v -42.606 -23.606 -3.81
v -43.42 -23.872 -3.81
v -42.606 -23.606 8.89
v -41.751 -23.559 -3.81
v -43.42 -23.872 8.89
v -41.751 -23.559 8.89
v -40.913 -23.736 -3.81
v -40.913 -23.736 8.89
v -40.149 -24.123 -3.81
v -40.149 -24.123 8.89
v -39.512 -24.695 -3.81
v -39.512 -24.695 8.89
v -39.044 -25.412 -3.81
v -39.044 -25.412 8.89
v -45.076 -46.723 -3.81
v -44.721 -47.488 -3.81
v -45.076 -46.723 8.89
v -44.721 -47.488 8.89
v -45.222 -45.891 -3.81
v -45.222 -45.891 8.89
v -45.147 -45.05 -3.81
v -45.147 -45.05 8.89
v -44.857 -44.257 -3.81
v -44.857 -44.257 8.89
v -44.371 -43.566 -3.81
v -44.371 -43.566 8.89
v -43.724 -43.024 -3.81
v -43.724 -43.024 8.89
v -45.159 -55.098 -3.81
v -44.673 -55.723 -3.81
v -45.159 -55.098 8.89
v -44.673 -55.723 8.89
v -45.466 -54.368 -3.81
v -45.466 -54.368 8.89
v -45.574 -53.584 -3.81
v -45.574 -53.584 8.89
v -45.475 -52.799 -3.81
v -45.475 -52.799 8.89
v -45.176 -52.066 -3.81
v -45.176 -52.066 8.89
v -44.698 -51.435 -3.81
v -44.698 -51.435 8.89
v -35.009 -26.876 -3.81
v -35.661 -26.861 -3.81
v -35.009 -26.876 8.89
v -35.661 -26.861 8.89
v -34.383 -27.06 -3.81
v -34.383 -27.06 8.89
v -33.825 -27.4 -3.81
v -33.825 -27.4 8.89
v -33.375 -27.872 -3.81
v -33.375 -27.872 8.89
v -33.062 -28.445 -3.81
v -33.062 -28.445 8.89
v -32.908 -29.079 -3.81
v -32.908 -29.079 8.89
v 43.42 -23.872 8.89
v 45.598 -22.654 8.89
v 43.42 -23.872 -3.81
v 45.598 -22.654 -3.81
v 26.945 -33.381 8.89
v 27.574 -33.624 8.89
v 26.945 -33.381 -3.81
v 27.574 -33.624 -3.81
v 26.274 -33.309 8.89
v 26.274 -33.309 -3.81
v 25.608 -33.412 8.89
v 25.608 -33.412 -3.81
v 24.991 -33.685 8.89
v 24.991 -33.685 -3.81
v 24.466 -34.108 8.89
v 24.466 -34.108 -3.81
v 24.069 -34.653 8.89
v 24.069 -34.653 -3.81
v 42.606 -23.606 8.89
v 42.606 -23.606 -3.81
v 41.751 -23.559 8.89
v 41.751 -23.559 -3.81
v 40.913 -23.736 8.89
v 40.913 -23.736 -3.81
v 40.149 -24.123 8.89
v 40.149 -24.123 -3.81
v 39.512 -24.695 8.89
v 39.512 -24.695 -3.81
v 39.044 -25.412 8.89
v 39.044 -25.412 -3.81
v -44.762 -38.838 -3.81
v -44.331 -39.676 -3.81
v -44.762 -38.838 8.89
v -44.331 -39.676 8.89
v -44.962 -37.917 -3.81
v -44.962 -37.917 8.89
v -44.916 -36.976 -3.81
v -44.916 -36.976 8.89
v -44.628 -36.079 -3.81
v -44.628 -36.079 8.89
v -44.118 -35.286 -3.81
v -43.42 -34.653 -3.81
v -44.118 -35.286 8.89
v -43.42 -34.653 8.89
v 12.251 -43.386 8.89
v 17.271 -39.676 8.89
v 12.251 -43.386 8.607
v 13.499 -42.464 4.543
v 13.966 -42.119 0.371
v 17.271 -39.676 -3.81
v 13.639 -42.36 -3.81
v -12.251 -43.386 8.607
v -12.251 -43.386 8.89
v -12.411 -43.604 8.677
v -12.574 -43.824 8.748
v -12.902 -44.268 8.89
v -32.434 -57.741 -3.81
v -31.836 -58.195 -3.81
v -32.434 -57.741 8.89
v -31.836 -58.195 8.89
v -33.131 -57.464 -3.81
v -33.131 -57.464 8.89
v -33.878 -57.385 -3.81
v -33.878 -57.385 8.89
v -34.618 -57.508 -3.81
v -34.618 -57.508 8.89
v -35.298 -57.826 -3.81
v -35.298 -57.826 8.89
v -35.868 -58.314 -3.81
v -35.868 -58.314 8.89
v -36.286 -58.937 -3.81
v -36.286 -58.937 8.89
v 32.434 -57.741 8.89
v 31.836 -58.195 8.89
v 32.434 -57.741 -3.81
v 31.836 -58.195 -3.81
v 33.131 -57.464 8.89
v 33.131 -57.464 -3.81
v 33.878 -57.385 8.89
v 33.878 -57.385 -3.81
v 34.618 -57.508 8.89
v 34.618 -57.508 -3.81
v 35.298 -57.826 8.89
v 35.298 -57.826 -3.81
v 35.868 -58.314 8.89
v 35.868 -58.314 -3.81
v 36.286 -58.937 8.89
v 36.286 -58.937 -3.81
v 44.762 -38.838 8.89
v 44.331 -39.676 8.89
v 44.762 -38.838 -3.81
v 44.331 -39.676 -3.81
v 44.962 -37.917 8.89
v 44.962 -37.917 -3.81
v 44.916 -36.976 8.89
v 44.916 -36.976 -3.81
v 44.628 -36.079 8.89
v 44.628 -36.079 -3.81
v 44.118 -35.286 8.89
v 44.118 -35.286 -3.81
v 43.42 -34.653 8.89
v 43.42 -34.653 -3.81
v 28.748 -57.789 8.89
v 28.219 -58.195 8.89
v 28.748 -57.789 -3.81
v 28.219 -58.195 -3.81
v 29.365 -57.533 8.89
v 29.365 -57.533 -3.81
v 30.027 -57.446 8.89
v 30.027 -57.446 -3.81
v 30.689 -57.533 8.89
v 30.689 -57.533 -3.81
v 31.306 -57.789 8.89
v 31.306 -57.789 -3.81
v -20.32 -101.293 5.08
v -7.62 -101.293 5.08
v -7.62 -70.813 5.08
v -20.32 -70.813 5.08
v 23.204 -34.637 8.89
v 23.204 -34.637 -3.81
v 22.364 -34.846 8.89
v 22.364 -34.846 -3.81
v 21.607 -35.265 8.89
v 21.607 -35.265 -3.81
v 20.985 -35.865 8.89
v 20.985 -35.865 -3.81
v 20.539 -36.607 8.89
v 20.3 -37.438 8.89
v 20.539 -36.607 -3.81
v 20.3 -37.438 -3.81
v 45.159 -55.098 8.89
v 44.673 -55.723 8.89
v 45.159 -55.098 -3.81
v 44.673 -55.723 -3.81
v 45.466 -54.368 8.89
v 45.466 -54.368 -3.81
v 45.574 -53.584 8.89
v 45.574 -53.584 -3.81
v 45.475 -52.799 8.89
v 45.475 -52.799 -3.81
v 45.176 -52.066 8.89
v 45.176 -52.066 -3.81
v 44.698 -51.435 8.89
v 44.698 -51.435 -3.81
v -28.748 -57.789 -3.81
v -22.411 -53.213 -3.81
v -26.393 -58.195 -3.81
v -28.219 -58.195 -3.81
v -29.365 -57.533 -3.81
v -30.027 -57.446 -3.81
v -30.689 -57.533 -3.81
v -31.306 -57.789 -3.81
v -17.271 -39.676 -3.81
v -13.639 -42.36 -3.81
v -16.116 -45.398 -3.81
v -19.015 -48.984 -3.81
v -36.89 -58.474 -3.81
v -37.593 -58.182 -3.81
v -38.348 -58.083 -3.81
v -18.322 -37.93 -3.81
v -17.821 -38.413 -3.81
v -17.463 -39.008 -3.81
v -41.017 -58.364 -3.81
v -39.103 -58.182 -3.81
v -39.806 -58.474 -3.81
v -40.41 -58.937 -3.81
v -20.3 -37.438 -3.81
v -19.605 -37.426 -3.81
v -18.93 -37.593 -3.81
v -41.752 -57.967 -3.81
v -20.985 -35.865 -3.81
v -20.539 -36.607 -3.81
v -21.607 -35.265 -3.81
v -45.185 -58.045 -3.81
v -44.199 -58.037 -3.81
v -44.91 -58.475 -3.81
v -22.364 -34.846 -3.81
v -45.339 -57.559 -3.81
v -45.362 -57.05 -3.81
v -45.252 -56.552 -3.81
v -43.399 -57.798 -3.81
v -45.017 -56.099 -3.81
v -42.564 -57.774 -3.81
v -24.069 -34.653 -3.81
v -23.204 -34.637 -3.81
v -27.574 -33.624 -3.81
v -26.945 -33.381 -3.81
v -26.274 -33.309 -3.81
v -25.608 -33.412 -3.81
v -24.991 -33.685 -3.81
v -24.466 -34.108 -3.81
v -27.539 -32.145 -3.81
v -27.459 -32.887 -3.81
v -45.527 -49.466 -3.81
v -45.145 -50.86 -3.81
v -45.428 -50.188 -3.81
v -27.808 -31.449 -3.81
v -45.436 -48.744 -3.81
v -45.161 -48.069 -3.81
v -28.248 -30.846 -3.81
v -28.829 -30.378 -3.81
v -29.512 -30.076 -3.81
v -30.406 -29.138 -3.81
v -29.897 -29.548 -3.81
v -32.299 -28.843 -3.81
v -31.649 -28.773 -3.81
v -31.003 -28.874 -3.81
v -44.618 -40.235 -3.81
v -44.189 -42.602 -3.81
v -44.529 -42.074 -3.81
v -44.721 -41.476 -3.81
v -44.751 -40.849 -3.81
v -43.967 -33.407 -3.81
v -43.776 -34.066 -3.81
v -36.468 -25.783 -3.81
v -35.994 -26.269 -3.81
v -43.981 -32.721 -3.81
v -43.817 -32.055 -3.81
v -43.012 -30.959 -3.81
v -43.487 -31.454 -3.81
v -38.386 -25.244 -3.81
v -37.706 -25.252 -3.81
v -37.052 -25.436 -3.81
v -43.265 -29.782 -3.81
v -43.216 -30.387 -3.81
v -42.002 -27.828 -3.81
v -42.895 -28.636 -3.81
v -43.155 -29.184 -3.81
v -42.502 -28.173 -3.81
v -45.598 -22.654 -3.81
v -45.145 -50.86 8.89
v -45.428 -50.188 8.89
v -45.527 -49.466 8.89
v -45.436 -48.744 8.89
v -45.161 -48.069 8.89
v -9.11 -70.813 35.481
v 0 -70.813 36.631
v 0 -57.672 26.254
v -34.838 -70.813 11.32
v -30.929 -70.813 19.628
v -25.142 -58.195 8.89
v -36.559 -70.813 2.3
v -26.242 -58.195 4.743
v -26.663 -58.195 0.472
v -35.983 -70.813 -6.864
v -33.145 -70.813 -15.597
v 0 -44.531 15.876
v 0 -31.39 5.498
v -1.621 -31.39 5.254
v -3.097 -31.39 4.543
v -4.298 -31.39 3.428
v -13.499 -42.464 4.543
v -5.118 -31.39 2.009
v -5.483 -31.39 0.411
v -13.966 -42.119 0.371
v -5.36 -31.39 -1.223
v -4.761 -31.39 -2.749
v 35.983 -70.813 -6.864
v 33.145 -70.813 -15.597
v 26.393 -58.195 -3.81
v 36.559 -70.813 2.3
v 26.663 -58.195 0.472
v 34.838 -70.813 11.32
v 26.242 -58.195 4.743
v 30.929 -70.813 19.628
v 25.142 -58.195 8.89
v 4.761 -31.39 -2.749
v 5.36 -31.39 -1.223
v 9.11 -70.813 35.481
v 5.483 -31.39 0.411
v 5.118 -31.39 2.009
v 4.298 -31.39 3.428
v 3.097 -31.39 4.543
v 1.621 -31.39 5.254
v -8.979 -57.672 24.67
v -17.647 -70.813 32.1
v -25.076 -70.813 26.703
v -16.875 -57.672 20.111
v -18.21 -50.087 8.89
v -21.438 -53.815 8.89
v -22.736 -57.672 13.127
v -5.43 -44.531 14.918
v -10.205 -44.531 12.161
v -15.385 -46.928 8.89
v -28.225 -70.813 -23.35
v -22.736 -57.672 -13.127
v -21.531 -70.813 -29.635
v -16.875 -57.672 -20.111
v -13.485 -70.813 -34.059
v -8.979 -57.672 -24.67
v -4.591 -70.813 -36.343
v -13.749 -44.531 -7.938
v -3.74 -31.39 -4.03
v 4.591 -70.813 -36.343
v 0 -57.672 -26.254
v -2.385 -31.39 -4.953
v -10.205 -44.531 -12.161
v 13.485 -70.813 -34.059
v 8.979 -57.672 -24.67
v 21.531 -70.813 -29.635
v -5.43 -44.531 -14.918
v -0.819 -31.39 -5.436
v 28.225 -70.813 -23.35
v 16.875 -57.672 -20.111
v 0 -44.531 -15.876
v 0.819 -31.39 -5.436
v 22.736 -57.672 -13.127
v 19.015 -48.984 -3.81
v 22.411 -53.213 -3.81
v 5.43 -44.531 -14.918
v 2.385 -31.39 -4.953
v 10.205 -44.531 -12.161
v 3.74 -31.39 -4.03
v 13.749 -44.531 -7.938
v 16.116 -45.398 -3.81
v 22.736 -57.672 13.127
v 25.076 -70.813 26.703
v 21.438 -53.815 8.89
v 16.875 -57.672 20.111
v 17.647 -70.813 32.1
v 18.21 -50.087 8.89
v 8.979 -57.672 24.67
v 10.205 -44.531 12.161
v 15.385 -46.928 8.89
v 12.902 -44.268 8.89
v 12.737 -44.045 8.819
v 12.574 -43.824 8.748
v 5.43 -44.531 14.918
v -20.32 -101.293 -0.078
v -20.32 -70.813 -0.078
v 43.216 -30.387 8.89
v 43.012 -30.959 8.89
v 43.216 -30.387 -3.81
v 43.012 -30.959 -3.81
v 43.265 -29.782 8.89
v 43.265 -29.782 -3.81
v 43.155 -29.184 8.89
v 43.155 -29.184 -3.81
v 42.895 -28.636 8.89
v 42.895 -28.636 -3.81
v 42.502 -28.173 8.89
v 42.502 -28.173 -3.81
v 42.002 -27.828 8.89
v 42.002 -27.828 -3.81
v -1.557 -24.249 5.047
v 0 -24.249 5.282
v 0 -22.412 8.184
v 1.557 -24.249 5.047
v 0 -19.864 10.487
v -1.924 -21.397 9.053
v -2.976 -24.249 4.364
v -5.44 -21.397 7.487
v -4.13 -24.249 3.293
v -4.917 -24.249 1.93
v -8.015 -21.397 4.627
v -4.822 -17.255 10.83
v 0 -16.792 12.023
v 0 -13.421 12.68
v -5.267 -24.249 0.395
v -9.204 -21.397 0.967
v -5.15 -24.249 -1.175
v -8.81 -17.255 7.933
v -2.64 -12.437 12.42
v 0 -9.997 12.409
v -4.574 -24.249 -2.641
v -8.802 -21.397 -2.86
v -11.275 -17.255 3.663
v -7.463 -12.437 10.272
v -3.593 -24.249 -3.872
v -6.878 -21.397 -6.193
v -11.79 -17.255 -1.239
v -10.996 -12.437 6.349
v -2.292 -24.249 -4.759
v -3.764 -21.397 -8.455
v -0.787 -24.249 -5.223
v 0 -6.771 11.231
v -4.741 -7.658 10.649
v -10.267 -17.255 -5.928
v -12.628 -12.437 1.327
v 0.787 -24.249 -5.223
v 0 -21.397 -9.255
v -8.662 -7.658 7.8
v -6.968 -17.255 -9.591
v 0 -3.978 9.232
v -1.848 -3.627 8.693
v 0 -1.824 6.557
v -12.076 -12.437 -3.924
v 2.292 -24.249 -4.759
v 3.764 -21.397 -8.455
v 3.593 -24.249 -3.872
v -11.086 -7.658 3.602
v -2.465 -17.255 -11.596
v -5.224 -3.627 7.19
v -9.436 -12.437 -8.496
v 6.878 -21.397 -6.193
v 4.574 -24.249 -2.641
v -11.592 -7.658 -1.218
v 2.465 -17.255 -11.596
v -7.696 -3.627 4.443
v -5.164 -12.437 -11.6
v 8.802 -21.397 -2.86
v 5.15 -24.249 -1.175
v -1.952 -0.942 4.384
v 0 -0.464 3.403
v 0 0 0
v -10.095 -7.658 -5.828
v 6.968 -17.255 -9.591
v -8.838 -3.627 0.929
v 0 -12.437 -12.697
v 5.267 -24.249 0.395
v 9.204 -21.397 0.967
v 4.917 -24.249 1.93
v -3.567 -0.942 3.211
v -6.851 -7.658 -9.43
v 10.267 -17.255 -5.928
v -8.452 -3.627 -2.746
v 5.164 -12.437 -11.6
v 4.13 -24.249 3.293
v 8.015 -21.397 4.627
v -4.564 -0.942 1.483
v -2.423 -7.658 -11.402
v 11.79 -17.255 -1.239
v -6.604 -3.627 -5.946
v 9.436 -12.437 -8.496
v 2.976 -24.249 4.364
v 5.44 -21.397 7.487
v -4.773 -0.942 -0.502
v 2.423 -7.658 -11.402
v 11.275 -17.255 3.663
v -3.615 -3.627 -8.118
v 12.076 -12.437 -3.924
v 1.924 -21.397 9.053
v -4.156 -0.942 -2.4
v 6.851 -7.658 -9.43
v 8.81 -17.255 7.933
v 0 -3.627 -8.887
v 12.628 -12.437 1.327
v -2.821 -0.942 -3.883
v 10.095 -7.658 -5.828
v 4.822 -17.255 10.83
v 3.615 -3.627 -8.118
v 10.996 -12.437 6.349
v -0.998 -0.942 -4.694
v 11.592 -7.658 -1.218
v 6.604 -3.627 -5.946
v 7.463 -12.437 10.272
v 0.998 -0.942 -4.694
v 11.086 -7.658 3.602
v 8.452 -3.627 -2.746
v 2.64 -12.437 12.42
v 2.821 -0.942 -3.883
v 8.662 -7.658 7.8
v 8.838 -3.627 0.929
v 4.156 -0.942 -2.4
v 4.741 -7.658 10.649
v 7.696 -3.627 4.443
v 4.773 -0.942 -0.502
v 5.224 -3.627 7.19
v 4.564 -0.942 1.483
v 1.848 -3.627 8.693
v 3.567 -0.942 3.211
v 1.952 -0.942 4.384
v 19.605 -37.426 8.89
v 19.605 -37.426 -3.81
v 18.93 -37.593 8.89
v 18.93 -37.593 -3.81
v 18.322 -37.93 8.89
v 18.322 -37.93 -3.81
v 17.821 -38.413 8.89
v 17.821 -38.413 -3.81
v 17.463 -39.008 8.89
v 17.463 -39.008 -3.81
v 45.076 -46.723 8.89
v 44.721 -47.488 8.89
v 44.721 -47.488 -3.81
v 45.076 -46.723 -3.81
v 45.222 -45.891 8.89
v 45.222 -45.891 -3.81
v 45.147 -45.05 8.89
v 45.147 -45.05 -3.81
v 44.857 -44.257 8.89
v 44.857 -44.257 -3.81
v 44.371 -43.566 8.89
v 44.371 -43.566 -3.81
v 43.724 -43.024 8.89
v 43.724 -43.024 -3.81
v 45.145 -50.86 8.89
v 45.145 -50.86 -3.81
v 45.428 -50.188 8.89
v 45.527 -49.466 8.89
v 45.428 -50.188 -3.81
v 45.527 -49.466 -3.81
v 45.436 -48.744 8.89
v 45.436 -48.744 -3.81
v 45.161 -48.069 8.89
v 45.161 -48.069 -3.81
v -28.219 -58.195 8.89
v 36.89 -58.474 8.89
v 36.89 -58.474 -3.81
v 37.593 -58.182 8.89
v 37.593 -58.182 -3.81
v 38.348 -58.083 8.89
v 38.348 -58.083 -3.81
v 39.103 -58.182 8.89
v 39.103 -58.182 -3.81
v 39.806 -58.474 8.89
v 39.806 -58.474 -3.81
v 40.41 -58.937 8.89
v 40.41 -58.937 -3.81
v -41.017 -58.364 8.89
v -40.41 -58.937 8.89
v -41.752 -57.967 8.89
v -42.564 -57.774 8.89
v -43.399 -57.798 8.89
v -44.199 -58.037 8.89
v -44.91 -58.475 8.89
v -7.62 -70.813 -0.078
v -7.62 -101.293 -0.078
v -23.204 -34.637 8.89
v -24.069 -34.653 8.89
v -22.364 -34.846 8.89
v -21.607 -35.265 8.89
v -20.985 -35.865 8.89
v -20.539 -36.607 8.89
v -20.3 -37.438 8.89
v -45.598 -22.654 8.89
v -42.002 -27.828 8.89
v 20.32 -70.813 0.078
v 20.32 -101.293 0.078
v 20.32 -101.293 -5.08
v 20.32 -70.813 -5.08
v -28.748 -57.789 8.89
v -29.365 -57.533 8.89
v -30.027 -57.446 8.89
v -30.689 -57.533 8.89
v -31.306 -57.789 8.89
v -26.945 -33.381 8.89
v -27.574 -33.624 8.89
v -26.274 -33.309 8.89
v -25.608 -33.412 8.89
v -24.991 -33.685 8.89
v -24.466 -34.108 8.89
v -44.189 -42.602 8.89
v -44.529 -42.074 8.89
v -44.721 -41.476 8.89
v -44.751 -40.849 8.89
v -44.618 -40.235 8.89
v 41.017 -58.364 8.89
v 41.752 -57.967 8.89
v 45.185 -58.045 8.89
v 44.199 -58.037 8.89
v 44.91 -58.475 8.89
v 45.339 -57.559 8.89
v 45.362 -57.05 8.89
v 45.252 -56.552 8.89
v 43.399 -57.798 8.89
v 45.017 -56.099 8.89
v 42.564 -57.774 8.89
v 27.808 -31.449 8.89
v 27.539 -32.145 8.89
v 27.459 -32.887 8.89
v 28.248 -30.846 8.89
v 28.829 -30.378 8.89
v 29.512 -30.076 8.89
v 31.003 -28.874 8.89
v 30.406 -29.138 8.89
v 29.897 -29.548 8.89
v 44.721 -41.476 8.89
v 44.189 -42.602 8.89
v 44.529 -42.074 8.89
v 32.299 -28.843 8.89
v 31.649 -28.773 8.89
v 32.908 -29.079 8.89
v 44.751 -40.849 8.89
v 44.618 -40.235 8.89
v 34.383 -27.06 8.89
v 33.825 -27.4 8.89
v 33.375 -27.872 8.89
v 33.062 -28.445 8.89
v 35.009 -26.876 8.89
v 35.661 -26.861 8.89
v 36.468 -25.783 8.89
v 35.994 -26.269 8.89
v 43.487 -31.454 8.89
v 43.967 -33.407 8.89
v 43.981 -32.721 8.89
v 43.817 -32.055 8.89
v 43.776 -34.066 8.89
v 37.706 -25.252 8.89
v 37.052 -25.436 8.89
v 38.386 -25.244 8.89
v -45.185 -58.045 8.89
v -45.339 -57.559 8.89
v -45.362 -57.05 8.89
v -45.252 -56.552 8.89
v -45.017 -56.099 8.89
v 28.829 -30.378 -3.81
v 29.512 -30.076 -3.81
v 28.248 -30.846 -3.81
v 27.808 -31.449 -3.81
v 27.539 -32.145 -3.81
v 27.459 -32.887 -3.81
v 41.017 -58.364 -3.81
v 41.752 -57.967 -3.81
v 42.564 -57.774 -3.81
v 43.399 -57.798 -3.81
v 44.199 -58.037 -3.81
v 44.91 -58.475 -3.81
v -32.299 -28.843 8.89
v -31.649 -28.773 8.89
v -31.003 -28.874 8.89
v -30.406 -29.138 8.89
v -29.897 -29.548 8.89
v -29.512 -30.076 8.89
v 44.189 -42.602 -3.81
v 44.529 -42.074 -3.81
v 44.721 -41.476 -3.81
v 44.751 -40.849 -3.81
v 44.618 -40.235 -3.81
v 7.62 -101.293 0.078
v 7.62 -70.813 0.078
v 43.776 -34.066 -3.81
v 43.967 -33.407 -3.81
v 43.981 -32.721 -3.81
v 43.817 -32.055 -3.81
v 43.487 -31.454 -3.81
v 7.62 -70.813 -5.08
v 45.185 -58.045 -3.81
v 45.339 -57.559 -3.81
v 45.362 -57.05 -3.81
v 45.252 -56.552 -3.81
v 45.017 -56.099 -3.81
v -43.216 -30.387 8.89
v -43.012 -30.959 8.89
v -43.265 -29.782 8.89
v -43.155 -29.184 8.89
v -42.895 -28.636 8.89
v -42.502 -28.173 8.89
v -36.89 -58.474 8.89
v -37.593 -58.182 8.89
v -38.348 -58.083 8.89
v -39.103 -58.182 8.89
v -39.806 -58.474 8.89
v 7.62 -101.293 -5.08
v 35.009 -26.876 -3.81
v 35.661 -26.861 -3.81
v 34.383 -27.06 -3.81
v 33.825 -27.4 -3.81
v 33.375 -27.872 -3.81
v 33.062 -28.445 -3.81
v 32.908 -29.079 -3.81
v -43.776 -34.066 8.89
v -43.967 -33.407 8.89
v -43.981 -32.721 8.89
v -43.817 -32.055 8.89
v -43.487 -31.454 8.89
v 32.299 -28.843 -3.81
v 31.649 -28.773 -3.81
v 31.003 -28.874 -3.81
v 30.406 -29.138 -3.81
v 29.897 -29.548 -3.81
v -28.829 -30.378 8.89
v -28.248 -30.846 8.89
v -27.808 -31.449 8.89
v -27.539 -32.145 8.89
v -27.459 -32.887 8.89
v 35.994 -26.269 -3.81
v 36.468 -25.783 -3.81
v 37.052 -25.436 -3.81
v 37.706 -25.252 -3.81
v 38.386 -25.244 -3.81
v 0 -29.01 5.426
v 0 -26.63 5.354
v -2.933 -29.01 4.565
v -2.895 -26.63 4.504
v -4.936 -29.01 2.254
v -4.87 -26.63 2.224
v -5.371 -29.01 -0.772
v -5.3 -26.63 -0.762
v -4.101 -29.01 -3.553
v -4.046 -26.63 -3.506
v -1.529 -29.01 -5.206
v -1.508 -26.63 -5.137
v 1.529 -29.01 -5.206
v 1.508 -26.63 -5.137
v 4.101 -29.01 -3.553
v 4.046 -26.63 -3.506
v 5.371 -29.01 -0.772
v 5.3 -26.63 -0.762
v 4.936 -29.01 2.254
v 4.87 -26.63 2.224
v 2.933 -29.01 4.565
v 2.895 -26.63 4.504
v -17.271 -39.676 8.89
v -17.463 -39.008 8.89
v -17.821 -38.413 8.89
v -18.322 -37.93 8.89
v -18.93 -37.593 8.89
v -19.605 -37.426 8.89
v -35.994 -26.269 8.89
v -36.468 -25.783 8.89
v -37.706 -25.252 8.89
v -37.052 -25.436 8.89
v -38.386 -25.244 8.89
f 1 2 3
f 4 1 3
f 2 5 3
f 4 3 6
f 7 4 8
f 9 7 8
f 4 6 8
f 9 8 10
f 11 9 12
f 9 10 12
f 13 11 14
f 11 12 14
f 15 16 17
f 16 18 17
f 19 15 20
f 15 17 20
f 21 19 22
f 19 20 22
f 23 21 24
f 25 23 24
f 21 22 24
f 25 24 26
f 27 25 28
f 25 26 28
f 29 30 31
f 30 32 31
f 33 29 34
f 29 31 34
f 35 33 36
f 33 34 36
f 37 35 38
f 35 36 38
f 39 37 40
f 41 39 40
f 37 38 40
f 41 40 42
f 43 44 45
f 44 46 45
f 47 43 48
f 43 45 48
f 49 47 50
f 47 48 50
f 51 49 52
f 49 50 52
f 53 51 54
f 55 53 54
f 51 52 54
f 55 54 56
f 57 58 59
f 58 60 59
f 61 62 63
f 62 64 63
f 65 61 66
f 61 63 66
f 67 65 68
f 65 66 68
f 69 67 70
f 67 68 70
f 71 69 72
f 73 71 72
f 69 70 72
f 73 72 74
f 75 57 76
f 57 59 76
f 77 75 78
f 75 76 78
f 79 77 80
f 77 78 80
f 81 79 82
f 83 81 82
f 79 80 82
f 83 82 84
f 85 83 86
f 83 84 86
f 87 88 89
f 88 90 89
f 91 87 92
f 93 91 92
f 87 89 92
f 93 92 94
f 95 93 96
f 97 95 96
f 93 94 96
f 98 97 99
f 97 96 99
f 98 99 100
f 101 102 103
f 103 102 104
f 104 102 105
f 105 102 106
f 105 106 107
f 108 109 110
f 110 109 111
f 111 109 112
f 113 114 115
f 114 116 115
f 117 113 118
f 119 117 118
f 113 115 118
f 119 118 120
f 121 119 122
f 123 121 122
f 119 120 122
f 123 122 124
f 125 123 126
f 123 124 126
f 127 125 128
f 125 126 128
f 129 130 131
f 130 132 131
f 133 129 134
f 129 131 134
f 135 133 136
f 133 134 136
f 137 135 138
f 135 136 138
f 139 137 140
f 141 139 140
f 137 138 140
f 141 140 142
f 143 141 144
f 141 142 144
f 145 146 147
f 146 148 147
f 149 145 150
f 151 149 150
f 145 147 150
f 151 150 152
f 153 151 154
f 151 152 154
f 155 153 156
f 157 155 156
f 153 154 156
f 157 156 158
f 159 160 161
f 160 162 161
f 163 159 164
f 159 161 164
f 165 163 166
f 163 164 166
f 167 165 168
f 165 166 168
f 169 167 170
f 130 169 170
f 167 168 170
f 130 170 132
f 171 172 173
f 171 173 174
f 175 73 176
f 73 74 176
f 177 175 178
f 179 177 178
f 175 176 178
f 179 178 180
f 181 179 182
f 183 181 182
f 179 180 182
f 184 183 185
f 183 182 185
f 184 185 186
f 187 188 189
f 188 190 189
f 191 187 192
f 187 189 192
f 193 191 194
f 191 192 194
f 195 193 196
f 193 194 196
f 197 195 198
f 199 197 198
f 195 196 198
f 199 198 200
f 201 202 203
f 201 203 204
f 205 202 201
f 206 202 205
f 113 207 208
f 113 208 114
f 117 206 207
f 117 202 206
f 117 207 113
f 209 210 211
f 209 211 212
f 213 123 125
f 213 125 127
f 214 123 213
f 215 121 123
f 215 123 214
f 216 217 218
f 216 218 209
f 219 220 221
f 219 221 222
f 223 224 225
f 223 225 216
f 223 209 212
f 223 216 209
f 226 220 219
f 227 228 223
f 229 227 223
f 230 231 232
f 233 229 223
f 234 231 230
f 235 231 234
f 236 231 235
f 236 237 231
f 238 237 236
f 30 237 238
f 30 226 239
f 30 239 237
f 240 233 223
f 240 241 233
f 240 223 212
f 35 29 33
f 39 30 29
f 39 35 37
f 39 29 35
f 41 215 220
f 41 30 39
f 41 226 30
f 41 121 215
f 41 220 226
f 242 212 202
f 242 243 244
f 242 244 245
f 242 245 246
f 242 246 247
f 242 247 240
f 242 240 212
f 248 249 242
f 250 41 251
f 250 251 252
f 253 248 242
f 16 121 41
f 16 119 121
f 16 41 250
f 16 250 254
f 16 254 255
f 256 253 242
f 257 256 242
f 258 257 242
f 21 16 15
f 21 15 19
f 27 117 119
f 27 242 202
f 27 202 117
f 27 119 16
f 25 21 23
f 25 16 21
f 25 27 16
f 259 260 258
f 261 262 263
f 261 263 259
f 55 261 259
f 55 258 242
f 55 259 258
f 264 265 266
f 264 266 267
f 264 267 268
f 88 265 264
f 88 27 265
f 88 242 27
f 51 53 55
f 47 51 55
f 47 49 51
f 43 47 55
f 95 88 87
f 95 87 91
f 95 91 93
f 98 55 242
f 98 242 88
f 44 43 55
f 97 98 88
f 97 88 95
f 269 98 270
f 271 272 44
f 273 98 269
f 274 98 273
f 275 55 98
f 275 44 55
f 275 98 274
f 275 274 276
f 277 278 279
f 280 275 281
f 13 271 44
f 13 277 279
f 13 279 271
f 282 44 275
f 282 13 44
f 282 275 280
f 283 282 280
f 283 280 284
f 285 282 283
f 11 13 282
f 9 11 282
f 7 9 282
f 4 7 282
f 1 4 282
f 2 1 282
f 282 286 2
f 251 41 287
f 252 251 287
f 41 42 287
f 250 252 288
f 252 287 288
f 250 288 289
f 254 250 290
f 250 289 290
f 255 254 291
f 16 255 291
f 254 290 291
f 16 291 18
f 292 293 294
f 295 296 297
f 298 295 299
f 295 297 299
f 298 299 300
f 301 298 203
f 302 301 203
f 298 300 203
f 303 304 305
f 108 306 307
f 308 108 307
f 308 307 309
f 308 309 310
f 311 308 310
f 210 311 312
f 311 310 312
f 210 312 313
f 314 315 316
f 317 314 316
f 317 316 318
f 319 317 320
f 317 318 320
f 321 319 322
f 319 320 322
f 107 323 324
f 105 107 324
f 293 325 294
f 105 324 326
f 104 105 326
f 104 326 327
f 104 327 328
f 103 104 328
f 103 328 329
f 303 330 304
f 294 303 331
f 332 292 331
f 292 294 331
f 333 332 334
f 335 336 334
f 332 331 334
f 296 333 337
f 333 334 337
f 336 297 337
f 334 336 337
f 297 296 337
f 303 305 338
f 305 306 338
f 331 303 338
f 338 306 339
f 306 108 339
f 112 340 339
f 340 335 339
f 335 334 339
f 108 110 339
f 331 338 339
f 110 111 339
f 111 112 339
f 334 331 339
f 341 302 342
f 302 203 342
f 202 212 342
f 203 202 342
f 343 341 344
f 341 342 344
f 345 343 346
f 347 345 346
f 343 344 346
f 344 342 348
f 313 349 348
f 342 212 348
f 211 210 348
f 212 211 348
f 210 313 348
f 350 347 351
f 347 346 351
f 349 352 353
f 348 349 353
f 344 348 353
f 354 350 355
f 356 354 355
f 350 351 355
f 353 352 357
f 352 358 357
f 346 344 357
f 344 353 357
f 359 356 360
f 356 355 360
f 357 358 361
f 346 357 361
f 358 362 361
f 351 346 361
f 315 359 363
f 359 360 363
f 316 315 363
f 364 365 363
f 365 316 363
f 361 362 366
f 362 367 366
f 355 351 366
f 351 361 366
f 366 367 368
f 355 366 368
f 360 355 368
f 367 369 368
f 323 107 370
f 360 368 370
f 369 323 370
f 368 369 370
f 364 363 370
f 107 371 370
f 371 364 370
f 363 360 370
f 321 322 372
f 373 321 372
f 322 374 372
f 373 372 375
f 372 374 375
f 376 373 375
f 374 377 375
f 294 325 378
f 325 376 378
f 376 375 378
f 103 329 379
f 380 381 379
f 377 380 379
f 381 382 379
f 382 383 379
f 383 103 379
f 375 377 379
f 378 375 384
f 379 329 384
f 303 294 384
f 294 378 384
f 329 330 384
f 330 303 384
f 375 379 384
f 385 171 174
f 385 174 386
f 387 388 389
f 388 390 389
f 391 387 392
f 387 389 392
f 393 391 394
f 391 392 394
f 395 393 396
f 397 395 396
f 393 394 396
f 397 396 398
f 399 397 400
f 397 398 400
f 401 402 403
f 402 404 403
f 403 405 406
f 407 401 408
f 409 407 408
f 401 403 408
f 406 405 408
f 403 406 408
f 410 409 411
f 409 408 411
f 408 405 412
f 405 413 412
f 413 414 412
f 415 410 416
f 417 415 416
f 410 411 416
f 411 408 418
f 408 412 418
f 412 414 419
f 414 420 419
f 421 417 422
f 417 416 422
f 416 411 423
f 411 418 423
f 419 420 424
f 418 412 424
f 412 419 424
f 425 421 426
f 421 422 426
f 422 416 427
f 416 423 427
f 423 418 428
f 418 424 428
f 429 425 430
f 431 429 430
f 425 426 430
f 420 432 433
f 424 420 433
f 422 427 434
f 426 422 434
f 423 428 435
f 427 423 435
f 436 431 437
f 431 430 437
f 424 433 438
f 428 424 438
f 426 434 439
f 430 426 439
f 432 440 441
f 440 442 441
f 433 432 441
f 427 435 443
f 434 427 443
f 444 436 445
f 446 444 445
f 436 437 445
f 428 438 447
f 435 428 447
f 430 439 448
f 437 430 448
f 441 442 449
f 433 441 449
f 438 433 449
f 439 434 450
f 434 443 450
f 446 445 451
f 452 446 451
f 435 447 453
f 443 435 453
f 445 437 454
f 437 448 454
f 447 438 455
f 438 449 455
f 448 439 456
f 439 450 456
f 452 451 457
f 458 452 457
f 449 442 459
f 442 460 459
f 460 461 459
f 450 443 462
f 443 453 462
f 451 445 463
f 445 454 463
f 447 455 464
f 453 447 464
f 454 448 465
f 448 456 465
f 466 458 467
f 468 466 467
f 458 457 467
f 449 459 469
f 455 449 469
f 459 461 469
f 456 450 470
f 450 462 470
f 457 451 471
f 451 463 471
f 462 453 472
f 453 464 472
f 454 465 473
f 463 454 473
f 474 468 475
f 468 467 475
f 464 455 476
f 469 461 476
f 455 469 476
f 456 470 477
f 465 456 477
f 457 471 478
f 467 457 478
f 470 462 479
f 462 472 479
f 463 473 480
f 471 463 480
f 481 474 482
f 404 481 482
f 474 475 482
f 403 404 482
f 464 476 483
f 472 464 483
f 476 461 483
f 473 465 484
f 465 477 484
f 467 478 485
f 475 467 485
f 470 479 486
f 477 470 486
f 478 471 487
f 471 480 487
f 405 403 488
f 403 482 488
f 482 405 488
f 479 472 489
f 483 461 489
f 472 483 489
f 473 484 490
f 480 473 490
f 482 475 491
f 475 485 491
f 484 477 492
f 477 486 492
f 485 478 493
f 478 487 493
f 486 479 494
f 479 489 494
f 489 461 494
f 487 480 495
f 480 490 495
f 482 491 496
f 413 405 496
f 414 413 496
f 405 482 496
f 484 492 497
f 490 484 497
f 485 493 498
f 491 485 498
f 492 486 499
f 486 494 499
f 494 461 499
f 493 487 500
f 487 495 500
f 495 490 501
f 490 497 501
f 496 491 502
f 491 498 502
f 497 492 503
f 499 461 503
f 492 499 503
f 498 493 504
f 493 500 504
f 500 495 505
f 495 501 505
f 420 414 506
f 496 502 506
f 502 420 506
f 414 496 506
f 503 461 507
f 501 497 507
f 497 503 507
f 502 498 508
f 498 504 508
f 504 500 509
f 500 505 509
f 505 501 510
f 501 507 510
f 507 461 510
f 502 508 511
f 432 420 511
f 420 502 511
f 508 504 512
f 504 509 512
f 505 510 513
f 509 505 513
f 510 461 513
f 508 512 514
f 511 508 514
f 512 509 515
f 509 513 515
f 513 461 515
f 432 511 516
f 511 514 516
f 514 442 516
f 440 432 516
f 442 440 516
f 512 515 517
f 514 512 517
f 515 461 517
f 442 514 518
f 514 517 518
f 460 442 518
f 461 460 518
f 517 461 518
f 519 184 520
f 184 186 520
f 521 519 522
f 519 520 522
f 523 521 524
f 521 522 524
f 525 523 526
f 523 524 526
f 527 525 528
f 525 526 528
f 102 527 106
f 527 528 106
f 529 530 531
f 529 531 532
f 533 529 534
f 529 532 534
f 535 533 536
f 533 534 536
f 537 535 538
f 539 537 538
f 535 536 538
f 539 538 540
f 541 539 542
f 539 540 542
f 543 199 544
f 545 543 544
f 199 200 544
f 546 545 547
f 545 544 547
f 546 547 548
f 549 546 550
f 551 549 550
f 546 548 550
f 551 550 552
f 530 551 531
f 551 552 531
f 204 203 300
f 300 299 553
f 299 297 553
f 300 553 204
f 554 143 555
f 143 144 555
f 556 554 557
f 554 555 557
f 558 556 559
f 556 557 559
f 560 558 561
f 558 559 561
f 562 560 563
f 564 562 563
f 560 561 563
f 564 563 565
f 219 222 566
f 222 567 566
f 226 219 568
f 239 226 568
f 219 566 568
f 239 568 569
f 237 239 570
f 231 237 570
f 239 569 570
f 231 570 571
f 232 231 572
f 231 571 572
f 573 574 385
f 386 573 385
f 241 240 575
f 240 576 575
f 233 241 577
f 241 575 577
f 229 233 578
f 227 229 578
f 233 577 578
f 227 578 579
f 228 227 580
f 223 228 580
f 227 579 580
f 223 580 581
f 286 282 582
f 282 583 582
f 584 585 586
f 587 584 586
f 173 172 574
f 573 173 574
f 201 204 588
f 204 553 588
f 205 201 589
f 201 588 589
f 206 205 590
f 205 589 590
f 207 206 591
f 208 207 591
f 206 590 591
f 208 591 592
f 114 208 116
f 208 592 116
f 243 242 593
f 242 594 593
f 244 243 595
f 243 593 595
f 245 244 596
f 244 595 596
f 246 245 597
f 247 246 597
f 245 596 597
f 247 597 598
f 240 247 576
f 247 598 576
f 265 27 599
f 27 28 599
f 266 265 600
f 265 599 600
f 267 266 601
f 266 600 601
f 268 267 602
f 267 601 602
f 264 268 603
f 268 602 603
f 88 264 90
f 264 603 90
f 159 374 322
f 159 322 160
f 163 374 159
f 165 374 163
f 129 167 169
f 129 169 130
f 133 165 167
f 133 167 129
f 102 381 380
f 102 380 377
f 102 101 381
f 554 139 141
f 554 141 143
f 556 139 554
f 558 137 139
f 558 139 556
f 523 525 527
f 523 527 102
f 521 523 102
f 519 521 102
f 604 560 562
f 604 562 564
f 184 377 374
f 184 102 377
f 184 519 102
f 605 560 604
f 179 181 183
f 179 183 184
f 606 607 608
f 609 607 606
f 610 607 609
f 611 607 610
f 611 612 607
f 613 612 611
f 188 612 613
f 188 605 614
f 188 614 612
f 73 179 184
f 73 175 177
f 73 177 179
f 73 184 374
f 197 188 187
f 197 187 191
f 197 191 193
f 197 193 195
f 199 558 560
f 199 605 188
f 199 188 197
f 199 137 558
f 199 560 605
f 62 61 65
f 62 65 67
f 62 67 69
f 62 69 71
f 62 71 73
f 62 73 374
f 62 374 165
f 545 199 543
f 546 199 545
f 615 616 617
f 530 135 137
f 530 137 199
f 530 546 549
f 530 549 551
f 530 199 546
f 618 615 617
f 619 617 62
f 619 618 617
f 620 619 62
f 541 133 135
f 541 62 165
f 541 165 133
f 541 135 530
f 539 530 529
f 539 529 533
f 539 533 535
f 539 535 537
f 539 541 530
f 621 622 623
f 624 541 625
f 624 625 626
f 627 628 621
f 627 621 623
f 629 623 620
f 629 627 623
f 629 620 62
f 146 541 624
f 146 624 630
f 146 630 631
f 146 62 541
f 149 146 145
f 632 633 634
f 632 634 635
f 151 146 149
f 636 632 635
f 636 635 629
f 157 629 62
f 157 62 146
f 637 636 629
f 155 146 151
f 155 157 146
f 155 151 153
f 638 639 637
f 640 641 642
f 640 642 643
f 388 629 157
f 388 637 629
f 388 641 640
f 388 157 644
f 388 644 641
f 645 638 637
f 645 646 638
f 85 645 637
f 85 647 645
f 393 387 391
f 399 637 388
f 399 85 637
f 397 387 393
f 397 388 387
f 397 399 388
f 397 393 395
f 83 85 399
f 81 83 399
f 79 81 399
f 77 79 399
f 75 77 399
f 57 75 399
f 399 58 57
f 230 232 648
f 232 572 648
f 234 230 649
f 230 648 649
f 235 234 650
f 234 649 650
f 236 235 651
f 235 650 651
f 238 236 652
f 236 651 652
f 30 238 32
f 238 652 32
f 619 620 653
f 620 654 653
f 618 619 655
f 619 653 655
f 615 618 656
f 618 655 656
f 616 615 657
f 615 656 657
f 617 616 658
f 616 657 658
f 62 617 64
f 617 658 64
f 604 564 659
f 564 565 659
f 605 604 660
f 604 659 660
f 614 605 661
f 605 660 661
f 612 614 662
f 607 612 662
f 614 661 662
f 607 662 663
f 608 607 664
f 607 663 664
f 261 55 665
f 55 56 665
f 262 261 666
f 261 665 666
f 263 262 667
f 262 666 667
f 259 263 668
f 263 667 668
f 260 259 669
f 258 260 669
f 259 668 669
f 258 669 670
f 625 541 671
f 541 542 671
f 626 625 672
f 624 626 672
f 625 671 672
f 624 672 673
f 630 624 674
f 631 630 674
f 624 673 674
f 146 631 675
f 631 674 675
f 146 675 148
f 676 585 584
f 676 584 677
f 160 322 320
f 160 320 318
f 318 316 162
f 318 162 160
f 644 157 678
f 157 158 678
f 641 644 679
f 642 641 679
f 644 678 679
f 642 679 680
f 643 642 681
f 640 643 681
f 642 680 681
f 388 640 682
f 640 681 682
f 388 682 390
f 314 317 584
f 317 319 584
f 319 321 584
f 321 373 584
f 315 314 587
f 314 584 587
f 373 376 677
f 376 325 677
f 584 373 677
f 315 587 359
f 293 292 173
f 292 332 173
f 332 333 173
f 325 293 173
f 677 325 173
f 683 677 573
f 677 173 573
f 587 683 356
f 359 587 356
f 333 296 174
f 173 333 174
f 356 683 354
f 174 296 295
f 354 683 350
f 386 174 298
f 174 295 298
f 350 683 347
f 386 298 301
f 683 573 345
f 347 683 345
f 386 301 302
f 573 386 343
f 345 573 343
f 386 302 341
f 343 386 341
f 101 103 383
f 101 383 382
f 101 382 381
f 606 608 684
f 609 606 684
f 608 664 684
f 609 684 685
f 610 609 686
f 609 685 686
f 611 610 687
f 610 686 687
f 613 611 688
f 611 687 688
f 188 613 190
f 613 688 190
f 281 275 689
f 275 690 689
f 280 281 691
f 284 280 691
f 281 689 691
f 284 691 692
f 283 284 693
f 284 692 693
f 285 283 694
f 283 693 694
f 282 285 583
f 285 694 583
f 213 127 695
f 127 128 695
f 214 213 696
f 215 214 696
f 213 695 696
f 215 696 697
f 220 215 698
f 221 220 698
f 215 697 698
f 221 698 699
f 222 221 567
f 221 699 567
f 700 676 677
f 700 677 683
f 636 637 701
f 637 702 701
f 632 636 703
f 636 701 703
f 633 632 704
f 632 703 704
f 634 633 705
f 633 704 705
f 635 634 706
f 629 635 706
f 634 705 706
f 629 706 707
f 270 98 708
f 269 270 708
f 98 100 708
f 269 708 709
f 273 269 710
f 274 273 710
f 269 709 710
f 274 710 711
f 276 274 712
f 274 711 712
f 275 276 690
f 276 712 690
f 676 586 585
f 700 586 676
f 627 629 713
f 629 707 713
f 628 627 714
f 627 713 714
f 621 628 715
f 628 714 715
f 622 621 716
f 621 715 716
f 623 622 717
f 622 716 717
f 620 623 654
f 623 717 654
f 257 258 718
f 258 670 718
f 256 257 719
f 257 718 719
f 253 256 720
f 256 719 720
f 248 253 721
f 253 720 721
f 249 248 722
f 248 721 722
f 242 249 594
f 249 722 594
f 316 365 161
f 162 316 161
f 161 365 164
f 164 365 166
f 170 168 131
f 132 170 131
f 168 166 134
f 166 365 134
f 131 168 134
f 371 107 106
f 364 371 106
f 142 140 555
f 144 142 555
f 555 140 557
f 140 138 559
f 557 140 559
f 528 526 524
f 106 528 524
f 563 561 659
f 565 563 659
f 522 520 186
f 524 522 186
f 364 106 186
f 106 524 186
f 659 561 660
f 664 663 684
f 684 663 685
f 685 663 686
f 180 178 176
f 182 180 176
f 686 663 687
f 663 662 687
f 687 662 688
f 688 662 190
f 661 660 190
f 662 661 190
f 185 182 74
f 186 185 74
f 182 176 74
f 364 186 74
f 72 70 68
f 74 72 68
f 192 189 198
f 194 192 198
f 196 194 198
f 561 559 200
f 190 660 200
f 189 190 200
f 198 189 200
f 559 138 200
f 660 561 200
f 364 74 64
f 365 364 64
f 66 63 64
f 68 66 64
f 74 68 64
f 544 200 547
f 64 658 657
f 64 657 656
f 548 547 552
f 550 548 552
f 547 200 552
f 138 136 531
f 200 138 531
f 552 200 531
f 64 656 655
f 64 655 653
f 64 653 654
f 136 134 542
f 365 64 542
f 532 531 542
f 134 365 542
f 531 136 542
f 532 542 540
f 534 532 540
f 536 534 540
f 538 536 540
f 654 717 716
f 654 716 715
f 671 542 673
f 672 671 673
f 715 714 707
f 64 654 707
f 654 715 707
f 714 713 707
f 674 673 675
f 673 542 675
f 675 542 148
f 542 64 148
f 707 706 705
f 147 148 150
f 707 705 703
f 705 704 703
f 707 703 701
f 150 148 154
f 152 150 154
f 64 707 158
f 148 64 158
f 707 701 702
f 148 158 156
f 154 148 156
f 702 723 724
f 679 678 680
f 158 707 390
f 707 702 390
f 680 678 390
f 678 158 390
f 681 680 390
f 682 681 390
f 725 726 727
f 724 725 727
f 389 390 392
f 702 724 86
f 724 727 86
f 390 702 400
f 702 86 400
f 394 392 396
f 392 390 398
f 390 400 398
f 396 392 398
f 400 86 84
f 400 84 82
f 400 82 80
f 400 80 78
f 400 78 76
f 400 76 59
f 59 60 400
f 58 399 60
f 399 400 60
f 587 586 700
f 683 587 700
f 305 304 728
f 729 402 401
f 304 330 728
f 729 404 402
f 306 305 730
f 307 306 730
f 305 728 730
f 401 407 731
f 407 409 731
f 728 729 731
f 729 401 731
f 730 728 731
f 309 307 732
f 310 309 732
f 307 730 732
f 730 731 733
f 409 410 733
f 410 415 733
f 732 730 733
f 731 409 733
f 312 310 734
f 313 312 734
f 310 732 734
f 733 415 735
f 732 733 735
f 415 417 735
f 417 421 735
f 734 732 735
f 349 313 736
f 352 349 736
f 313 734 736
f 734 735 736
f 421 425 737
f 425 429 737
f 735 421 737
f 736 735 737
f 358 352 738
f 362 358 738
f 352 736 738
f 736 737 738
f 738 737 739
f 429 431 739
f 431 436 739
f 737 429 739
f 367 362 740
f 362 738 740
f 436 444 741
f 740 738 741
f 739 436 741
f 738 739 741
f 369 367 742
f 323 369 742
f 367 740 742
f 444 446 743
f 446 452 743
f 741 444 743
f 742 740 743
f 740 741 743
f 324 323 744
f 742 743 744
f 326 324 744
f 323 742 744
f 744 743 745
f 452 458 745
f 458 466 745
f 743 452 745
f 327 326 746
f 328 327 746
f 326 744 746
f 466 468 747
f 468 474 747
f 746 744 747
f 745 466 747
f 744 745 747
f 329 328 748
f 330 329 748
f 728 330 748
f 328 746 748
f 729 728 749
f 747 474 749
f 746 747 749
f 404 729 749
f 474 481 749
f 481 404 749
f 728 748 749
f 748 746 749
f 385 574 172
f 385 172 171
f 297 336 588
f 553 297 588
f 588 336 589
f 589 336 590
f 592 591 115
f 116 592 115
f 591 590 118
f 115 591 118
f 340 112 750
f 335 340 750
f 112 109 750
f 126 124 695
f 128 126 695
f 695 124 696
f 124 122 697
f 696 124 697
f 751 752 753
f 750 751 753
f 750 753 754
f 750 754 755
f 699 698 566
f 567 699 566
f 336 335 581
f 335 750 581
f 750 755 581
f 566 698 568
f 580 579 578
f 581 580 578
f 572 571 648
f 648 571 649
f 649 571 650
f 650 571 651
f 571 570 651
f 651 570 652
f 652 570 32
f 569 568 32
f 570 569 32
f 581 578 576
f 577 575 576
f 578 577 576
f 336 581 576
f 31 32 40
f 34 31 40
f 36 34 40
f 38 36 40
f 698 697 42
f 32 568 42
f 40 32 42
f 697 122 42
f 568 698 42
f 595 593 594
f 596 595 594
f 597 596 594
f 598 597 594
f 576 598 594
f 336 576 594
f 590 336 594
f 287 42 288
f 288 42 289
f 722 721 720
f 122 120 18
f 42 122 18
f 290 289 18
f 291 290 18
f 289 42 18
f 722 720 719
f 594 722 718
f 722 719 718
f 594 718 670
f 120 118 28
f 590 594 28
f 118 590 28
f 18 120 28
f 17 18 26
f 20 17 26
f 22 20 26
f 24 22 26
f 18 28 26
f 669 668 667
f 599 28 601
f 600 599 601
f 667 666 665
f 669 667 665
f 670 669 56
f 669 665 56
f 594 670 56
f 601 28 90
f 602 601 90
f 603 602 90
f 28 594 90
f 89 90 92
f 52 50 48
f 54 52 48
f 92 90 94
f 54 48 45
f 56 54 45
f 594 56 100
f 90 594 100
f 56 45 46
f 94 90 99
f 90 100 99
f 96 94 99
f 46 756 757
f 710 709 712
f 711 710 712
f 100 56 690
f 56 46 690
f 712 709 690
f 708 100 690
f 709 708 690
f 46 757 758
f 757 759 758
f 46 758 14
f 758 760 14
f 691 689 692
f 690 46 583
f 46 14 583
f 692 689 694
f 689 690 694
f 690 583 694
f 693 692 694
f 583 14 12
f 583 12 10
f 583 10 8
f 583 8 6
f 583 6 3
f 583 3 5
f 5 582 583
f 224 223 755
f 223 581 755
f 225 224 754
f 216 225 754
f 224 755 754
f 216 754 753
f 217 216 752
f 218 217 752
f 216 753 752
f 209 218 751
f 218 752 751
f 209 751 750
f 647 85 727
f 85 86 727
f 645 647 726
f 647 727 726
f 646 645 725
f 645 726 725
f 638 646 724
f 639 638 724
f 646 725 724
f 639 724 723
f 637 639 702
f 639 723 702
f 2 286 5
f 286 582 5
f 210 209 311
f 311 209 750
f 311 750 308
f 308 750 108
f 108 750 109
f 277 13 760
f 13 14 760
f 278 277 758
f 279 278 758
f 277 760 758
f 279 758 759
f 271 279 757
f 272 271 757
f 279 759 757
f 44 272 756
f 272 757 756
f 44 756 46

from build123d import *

# Parameters (mm, degrees)
SKETCH2_W           = 12.7
SKETCH2_H           = 5.158072601
BOSS_EXTRUDE1_DEPTH = 30.48
BOSS_EXTRUDE2_DEPTH = 6.35


with BuildPart() as part:
    # Sketch1 → Revolve1 (revolve)
    with BuildSketch(Plane.XY, mode=Mode.PRIVATE) as revolve1_sk:
        with BuildLine():
            Line((5.497877947, -31.389690294), (5.282120164, -24.249424513))
            ThreePointArc((5.282120164, -24.249424513), (12.409022752, -9.99701011), (0, 0))
            Line((0, 0), (0, -70.812800241))
            Line((0, -70.812800241), (36.63136247, -70.812800241))
            Line((36.63136247, -70.812800241), (5.497877947, -31.389690294))
        make_face()
    revolve(revolve1_sk.sketch.rotate(Axis((0, 0, 0), (0, -1, 0)), 90), axis=Axis((0, 0, 0), (0, -1, 0)))  # turned: the seam where the file's is

    # Sketch2 → Boss-Extrude1 (add)
    with BuildSketch(Plane(origin=(0, -70.812800241, 0), x_dir=(-1, 0, 0), z_dir=(0, -1, 0))):
        with Locations((13.97, -2.5009637)):
            Rectangle(SKETCH2_W, SKETCH2_H)
        with Locations((-13.97, 2.5009637)):
            Rectangle(SKETCH2_W, SKETCH2_H)
    extrude(amount=BOSS_EXTRUDE1_DEPTH)

    # Sketch4 → Boss-Extrude2 (add, symmetric)
    with BuildSketch(Plane.XY.offset(2.54)):
        with BuildLine():
            Line((23.194397658, -58.195407075), (28.218678504, -58.195407075))
            ThreePointArc((28.218678504, -58.195407075), (30.027441839, -57.44619277), (31.836205173, -58.195407075))
            ThreePointArc((31.836205173, -58.195407075), (34.251957858, -57.421245639), (36.286043383, -58.937056657))
            ThreePointArc((36.286043383, -58.937056657), (38.347997753, -58.082967192), (40.409952123, -58.937056657))
            ThreePointArc((40.409952123, -58.937056657), (42.564346856, -57.773722125), (44.910335716, -58.474507515))
            ThreePointArc((44.910335716, -58.474507515), (45.361627038, -57.049665796), (44.673222951, -55.723039401))
            ThreePointArc((44.673222951, -55.723039401), (45.573759248, -53.584134002), (44.698100059, -51.434924167))
            ThreePointArc((44.698100059, -51.434924167), (45.526766993, -49.466398887), (44.720765428, -47.488485304))
            ThreePointArc((44.720765428, -47.488485304), (45.146776163, -45.049852477), (43.723637436, -43.024243586))
            ThreePointArc((43.723637436, -43.024243586), (44.720765428, -41.476171224), (44.331188928, -39.676442795))
            ThreePointArc((44.331188928, -39.676442795), (44.916218335, -36.976008484), (43.420401182, -34.652834811))
            ThreePointArc((43.420401182, -34.652834811), (43.980987953, -32.721408857), (43.01165827, -30.959289761))
            ThreePointArc((43.01165827, -30.959289761), (43.155496077, -29.184392296), (42.002162733, -27.827641575))
            Line((42.002162733, -27.827641575), (45.598003191, -22.653559314))
            Line((45.598003191, -22.653559314), (43.420401182, -23.871865995))
            ThreePointArc((43.420401182, -23.871865995), (40.913084014, -23.73552357), (39.043734388, -25.41205589))
            ThreePointArc((39.043734388, -25.41205589), (37.052487537, -25.435932109), (35.661346423, -26.860839296))
            ThreePointArc((35.661346423, -26.860839296), (33.825367945, -27.399752632), (32.908204388, -29.079054738))
            ThreePointArc((32.908204388, -29.079054738), (31.003426578, -28.874097378), (29.511618532, -30.076051946))
            ThreePointArc((29.511618532, -30.076051946), (27.807974314, -31.448683603), (27.573913087, -33.623939136))
            ThreePointArc((27.573913087, -33.623939136), (25.608192785, -33.412424259), (24.068655026, -34.652834811))
            ThreePointArc((24.068655026, -34.652834811), (21.607314855, -35.264896302), (20.299677359, -37.438119458))
            ThreePointArc((20.299677359, -37.438119458), (18.321683781, -37.929987145), (17.270834086, -39.676442795))
            Line((17.270834086, -39.676442795), (12.250540769, -43.386453078))
            Line((12.250540769, -43.386453078), (23.194397658, -58.195407075))
        make_face()
        with BuildLine():
            Line((-23.194397658, -58.195407075), (-28.218678504, -58.195407075))
            ThreePointArc((-28.218678504, -58.195407075), (-30.027441839, -57.44619277), (-31.836205173, -58.195407075))
            ThreePointArc((-31.836205173, -58.195407075), (-34.251957858, -57.421245639), (-36.286043383, -58.937056657))
            ThreePointArc((-36.286043383, -58.937056657), (-38.347997753, -58.082967192), (-40.409952123, -58.937056657))
            ThreePointArc((-40.409952123, -58.937056657), (-42.564346856, -57.773722125), (-44.910335716, -58.474507515))
            ThreePointArc((-44.910335716, -58.474507515), (-45.361627038, -57.049665796), (-44.673222951, -55.723039401))
            ThreePointArc((-44.673222951, -55.723039401), (-45.573759248, -53.584134002), (-44.698100059, -51.434924167))
            ThreePointArc((-44.698100059, -51.434924167), (-45.526766993, -49.466398887), (-44.720765428, -47.488485304))
            ThreePointArc((-44.720765428, -47.488485304), (-45.146776163, -45.049852477), (-43.723637436, -43.024243586))
            ThreePointArc((-43.723637436, -43.024243586), (-44.720765428, -41.476171224), (-44.331188928, -39.676442795))
            ThreePointArc((-44.331188928, -39.676442795), (-44.916218335, -36.976008484), (-43.420401182, -34.652834811))
            ThreePointArc((-43.420401182, -34.652834811), (-43.980987953, -32.721408857), (-43.01165827, -30.959289761))
            ThreePointArc((-43.01165827, -30.959289761), (-43.155496077, -29.184392296), (-42.002162733, -27.827641575))
            Line((-42.002162733, -27.827641575), (-45.598003191, -22.653559314))
            Line((-45.598003191, -22.653559314), (-43.420401182, -23.871865995))
            ThreePointArc((-43.420401182, -23.871865995), (-40.913084014, -23.73552357), (-39.043734388, -25.41205589))
            ThreePointArc((-39.043734388, -25.41205589), (-37.052487537, -25.435932109), (-35.661346423, -26.860839296))
            ThreePointArc((-35.661346423, -26.860839296), (-33.825367945, -27.399752632), (-32.908204388, -29.079054738))
            ThreePointArc((-32.908204388, -29.079054738), (-31.003426578, -28.874097378), (-29.511618532, -30.076051946))
            ThreePointArc((-29.511618532, -30.076051946), (-27.807974314, -31.448683603), (-27.573913087, -33.623939136))
            ThreePointArc((-27.573913087, -33.623939136), (-25.608192785, -33.412424259), (-24.068655026, -34.652834811))
            ThreePointArc((-24.068655026, -34.652834811), (-21.607314855, -35.264896302), (-20.299677359, -37.438119458))
            ThreePointArc((-20.299677359, -37.438119458), (-18.321683781, -37.929987145), (-17.270834086, -39.676442795))
            Line((-17.270834086, -39.676442795), (-12.250540769, -43.386453078))
            Line((-12.250540769, -43.386453078), (-23.194397658, -58.195407075))
        make_face()
    extrude(amount=BOSS_EXTRUDE2_DEPTH, both=True)


solid = part.part
